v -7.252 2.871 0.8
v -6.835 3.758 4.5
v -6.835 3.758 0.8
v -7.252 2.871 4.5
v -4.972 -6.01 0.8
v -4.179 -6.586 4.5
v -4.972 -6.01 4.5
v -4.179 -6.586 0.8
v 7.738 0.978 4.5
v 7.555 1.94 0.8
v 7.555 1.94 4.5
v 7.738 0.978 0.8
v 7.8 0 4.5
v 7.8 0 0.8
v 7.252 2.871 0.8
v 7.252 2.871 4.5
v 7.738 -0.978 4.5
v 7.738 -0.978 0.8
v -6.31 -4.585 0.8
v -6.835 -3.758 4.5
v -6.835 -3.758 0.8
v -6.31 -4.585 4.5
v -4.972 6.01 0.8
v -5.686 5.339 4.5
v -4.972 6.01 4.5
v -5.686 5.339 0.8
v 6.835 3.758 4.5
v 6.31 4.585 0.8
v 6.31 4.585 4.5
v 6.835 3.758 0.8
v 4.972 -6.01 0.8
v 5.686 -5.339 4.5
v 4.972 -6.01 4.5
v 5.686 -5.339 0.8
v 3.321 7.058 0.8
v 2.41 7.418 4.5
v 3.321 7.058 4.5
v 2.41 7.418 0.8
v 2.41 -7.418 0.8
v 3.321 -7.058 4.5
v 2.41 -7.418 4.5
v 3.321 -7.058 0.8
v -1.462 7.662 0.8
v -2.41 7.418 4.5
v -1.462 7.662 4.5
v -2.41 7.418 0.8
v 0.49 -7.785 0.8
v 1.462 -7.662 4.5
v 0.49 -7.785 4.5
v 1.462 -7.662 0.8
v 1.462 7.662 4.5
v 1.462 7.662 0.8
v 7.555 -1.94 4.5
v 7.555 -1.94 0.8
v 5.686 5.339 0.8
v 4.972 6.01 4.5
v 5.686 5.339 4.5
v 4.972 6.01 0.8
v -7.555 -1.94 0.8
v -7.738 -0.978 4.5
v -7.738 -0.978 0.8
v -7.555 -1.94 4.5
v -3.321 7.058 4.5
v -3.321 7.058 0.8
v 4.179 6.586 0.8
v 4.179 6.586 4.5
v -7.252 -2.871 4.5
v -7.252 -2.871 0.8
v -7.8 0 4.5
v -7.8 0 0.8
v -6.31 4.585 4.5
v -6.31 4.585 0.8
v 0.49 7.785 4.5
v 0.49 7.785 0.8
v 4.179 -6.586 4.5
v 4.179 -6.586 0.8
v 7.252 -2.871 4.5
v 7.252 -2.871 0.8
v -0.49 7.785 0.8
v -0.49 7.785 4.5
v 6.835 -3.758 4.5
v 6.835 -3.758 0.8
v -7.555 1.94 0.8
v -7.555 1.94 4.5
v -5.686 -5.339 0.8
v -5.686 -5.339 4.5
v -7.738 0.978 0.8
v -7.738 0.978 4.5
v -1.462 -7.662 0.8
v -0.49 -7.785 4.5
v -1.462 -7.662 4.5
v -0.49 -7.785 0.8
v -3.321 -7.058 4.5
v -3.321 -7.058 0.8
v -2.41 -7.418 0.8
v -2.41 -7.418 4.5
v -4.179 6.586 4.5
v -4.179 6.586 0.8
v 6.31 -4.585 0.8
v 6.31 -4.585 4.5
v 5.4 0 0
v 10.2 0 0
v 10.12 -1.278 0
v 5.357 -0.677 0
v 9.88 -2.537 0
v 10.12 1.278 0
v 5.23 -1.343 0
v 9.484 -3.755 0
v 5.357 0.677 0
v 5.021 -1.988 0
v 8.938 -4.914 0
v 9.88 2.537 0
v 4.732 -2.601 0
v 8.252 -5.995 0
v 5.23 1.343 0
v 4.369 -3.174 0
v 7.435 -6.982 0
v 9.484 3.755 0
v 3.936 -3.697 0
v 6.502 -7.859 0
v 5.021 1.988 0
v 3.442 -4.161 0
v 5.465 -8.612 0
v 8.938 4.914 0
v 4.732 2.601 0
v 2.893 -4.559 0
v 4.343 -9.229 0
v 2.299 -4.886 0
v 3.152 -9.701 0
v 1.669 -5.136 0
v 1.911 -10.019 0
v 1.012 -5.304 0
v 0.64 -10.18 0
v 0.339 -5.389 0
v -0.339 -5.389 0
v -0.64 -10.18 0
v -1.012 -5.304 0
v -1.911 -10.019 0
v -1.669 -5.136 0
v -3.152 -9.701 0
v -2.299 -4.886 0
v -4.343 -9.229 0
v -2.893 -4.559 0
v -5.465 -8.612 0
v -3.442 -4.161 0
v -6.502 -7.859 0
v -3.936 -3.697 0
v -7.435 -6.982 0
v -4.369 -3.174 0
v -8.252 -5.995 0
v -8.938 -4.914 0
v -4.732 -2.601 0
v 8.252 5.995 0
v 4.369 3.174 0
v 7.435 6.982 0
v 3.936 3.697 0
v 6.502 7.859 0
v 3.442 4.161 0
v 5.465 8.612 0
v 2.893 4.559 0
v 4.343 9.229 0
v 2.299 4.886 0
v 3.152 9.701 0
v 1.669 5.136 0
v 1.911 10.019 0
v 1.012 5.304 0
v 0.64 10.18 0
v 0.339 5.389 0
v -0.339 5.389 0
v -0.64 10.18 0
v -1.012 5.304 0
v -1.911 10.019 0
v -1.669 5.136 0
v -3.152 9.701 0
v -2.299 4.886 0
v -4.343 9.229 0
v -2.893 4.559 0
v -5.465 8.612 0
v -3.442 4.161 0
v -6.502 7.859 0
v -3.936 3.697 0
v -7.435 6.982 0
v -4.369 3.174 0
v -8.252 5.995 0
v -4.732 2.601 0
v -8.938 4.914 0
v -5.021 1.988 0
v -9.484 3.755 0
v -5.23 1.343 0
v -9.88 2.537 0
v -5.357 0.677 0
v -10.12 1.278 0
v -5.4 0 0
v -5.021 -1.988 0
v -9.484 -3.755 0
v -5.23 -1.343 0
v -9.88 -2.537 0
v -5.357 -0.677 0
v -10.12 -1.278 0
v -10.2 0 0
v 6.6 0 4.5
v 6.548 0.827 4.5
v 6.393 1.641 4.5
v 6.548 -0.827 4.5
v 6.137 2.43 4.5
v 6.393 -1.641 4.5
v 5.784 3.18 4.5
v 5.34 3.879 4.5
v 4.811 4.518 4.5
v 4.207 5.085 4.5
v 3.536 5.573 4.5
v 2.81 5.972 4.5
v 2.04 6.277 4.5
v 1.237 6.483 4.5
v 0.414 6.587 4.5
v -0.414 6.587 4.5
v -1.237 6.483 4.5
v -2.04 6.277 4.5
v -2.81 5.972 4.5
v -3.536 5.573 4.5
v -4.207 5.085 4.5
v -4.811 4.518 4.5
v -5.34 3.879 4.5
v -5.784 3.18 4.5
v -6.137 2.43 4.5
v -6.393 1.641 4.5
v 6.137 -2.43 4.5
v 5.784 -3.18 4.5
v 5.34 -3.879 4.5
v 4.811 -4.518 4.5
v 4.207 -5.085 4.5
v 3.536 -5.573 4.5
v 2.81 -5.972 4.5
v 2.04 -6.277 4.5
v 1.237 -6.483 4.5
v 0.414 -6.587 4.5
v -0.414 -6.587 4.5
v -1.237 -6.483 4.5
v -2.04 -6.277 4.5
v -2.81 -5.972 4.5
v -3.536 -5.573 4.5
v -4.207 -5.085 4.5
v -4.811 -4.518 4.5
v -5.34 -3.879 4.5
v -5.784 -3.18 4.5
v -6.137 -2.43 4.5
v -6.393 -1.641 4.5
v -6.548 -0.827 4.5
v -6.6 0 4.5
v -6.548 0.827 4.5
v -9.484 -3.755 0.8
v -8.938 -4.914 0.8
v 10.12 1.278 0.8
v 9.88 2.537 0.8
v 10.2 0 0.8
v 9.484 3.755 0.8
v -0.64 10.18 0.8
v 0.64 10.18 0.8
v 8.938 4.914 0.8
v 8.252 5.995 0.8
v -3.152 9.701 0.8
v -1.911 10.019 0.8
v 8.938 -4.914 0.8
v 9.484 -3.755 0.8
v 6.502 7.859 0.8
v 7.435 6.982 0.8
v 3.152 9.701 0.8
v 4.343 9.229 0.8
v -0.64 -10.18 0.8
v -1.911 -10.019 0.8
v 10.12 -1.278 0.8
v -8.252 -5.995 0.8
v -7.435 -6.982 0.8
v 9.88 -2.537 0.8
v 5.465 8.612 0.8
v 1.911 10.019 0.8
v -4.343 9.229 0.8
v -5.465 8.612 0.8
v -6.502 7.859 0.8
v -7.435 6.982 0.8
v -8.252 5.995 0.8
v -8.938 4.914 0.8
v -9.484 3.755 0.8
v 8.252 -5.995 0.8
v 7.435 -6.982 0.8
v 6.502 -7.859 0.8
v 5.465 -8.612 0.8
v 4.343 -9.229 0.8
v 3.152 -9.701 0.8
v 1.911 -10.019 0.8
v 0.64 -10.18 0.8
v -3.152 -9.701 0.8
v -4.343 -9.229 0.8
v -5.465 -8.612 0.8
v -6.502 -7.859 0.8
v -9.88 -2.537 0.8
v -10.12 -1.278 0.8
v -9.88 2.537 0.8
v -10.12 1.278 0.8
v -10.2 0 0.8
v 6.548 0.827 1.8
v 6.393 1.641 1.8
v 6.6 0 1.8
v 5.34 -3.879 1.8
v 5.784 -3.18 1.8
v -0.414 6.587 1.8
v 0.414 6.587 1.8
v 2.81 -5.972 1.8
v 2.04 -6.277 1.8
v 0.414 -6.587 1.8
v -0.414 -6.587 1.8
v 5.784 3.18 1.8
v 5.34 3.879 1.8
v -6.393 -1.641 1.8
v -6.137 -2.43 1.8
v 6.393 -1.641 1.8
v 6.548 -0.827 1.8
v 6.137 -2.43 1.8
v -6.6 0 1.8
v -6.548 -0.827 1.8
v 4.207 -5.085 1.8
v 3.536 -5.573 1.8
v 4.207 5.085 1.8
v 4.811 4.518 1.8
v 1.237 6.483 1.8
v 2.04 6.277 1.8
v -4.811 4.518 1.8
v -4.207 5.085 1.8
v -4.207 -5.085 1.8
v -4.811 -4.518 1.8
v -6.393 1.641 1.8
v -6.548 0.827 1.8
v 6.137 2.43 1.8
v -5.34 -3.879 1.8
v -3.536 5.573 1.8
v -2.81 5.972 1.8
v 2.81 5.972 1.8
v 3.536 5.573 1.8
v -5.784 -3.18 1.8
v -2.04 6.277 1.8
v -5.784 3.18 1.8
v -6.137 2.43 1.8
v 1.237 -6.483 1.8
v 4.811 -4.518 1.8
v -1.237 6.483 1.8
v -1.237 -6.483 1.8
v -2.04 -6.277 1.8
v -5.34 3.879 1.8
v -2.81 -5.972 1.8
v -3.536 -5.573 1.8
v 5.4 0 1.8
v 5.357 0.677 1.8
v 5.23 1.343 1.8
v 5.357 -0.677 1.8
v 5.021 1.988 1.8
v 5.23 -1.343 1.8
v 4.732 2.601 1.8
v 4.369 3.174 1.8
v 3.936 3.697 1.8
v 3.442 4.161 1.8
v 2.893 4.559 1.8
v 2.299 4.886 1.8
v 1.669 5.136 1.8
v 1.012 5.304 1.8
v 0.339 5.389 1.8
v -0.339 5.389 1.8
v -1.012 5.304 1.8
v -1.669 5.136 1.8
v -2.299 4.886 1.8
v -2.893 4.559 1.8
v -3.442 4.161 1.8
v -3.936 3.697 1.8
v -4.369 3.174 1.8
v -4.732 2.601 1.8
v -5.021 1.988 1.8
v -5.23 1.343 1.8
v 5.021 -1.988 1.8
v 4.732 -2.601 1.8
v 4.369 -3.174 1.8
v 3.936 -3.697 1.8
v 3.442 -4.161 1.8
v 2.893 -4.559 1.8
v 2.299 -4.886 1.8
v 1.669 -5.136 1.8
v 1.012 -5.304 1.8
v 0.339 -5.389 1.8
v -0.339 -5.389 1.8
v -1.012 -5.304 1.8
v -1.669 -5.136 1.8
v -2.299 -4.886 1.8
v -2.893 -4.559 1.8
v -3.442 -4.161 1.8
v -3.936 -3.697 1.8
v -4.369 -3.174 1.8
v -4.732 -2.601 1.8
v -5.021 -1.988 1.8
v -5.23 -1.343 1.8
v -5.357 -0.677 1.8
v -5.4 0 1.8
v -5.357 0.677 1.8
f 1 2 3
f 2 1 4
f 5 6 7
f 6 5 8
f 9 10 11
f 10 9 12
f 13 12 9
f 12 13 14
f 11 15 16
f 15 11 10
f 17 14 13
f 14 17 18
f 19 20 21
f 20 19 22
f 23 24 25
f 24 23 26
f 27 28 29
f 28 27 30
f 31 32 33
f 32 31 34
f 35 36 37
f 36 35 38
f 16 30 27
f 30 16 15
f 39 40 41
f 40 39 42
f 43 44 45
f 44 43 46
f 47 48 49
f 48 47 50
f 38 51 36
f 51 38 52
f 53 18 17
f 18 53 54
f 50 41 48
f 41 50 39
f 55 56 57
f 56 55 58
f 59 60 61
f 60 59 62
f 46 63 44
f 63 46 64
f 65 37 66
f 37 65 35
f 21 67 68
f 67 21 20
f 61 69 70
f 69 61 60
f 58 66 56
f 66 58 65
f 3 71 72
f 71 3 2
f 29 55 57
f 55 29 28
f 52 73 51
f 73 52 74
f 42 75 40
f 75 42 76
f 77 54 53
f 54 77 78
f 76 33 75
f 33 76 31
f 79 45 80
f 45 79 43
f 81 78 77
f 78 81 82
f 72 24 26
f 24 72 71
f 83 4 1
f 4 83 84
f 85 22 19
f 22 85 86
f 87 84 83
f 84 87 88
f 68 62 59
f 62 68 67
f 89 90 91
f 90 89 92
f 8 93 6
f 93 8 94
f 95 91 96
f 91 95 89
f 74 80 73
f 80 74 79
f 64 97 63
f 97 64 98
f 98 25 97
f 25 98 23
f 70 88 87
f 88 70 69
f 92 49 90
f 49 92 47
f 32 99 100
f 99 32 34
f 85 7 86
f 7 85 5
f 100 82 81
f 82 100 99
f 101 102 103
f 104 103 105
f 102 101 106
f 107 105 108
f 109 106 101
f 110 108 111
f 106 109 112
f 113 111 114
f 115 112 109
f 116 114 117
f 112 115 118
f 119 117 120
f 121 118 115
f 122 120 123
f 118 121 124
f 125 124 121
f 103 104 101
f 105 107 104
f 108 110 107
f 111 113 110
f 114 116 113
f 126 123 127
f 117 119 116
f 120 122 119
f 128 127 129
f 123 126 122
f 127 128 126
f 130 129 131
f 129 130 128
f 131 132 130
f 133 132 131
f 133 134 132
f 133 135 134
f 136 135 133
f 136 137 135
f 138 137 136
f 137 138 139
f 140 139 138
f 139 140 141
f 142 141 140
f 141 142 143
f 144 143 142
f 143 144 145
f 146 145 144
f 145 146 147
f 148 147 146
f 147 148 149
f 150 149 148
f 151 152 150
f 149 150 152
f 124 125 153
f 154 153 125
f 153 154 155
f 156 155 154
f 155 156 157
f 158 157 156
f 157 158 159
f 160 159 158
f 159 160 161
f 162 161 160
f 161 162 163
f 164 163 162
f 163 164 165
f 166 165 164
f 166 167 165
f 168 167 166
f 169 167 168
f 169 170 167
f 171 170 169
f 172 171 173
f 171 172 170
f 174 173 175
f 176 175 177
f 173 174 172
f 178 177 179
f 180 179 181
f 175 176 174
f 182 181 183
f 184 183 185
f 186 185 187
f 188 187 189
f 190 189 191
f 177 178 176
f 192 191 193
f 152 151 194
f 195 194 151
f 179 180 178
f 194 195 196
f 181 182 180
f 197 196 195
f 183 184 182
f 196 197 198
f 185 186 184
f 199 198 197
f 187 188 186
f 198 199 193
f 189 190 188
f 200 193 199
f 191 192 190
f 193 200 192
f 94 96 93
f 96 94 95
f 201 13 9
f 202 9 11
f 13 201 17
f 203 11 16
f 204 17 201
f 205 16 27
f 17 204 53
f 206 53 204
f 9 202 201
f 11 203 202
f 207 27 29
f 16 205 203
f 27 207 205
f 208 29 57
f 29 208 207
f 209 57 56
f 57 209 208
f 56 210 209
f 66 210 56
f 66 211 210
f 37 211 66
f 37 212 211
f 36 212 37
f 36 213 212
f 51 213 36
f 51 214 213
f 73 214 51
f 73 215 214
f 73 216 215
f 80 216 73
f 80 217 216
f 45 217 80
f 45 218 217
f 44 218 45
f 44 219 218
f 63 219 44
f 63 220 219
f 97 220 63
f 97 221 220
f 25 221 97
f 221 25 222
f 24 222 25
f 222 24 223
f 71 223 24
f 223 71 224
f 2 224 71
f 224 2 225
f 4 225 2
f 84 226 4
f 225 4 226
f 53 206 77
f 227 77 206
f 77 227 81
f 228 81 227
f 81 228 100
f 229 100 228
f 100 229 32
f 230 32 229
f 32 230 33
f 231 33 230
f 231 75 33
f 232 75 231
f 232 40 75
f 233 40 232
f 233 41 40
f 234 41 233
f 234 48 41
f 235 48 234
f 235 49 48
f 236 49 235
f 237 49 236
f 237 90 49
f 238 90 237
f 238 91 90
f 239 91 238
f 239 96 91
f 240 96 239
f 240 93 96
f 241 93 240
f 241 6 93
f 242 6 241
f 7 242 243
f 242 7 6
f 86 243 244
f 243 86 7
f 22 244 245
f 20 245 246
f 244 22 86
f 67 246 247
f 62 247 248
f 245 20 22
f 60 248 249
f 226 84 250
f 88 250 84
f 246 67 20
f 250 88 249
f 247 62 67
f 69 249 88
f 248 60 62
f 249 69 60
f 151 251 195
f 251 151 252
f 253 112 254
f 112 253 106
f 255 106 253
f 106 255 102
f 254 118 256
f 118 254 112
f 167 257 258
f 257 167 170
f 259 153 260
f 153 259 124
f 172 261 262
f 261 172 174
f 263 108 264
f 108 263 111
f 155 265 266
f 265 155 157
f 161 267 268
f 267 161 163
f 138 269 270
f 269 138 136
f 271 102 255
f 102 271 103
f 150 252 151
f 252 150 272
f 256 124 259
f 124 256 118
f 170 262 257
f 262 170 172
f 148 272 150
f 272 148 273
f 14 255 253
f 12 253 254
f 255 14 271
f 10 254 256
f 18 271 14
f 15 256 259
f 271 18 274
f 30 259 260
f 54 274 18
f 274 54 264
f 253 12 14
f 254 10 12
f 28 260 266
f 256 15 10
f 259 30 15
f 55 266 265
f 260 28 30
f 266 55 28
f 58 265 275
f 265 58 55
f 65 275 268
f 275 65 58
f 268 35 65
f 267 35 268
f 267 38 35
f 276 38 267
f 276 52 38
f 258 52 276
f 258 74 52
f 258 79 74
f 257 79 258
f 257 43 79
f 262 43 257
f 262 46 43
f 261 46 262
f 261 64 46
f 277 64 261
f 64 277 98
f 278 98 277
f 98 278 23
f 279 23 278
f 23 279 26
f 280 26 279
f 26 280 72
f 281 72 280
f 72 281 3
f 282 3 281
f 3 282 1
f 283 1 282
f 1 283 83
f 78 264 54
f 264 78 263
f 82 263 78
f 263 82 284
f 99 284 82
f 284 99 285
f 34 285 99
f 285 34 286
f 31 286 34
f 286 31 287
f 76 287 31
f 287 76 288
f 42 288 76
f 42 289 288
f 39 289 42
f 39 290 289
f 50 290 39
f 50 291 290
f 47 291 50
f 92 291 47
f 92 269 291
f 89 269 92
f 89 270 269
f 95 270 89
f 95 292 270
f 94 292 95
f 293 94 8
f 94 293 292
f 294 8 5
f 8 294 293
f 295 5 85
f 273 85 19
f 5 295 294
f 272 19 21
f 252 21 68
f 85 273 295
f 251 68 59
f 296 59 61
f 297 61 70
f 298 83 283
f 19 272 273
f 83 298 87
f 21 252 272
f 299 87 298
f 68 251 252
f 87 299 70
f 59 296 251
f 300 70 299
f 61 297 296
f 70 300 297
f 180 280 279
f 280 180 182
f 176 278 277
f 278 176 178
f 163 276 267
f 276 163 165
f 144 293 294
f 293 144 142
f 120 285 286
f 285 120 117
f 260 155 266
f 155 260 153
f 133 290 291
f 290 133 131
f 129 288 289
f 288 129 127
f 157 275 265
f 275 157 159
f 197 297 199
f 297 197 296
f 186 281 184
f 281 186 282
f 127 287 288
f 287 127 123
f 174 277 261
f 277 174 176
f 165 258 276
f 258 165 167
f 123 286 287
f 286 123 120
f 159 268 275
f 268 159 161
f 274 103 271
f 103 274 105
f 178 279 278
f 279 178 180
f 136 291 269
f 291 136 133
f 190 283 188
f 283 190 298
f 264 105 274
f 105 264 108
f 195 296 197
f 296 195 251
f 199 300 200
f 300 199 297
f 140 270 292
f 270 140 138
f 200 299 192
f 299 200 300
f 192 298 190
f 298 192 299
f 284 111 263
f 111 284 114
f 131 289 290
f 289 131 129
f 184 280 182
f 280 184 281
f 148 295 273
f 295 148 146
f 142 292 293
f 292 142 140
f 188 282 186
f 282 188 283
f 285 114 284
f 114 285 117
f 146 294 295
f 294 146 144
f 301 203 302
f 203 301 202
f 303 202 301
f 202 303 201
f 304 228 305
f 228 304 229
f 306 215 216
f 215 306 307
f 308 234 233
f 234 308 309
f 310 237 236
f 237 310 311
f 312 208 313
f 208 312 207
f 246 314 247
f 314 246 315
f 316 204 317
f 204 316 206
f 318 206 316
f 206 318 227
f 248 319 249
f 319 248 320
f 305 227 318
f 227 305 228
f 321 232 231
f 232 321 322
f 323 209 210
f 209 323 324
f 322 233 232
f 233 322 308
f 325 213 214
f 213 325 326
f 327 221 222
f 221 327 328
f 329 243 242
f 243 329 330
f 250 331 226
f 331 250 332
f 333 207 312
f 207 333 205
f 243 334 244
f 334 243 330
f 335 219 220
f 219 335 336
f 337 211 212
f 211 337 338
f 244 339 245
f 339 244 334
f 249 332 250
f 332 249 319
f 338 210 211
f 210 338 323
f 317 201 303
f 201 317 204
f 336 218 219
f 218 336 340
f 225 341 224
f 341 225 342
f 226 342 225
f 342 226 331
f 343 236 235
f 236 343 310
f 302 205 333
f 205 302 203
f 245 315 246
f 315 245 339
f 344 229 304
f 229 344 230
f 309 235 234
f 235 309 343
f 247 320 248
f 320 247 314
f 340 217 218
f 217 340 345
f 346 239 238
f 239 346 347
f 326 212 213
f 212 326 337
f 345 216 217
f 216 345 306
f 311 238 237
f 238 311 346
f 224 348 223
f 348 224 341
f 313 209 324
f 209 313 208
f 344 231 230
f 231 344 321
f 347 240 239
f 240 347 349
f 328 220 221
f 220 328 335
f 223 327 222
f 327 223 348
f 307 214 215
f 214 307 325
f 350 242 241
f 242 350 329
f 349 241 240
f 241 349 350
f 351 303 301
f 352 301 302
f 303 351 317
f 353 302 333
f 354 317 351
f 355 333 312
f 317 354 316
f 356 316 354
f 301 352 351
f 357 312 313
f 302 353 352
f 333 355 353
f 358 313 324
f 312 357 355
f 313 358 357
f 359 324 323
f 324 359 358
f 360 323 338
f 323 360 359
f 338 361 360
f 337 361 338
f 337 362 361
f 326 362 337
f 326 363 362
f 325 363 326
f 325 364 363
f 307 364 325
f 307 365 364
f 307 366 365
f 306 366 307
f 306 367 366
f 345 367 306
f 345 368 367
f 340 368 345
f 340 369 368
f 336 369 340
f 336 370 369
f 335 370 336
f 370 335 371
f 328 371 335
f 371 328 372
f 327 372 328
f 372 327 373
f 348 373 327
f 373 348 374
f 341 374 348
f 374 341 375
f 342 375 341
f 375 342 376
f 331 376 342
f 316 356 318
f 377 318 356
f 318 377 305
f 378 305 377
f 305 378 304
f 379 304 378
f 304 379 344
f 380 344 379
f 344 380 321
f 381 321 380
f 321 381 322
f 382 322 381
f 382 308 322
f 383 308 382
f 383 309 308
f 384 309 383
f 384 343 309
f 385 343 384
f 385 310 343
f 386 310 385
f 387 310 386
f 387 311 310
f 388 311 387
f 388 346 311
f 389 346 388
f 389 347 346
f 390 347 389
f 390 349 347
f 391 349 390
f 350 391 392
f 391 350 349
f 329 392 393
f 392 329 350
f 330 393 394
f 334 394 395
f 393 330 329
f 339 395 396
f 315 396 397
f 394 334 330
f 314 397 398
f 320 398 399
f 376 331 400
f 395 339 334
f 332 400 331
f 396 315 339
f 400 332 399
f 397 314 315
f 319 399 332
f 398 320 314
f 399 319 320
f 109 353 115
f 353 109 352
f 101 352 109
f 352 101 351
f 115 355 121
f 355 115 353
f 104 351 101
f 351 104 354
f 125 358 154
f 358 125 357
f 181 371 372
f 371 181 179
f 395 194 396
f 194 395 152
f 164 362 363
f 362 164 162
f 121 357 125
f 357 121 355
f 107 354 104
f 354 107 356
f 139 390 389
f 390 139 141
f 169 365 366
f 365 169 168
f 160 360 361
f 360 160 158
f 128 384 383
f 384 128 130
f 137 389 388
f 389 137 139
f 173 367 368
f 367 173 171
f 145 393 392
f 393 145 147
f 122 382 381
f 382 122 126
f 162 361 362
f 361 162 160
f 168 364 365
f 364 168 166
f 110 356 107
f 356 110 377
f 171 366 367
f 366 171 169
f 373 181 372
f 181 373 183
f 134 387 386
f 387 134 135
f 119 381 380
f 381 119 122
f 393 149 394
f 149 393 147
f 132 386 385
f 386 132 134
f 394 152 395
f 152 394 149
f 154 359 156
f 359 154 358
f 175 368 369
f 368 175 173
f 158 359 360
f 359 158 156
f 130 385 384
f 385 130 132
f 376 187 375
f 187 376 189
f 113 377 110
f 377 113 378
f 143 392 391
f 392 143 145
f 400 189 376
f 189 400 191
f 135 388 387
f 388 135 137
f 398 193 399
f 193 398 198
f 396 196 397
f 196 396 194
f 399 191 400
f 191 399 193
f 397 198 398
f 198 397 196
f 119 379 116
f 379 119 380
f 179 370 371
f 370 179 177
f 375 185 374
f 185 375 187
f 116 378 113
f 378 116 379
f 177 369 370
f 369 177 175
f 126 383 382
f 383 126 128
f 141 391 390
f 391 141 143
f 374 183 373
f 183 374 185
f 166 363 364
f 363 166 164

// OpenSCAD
// PRUSA iteration3
// 624 bearing belt guide
// GNU GPL v3
// Josef Průša <iam@josefprusa.cz> and contributors
// http://www.reprap.org/wiki/Prusa_Mendel
// http://prusamendel.org

wall= 1.2;
clearence= 0.1; 

module belt_guide_base(){
 cylinder(r=6.5+wall+clearence, h=4.5, $fn=50);
 cylinder(r=6.5+wall+clearence+2*wall, h=0.8, $fn=50);
}

module belt_guide_holes(){
 translate([0,0,1.8]) cylinder(r=6.5+clearence, h=10, $fn=50);
 translate([0,0,-1]) cylinder(r=6.5+wall+clearence-2*wall, h=10, $fn=50);
}

// Final part
module belt_guide(){
 difference(){
  belt_guide_base();
  belt_guide_holes();
 }
}

belt_guide();
